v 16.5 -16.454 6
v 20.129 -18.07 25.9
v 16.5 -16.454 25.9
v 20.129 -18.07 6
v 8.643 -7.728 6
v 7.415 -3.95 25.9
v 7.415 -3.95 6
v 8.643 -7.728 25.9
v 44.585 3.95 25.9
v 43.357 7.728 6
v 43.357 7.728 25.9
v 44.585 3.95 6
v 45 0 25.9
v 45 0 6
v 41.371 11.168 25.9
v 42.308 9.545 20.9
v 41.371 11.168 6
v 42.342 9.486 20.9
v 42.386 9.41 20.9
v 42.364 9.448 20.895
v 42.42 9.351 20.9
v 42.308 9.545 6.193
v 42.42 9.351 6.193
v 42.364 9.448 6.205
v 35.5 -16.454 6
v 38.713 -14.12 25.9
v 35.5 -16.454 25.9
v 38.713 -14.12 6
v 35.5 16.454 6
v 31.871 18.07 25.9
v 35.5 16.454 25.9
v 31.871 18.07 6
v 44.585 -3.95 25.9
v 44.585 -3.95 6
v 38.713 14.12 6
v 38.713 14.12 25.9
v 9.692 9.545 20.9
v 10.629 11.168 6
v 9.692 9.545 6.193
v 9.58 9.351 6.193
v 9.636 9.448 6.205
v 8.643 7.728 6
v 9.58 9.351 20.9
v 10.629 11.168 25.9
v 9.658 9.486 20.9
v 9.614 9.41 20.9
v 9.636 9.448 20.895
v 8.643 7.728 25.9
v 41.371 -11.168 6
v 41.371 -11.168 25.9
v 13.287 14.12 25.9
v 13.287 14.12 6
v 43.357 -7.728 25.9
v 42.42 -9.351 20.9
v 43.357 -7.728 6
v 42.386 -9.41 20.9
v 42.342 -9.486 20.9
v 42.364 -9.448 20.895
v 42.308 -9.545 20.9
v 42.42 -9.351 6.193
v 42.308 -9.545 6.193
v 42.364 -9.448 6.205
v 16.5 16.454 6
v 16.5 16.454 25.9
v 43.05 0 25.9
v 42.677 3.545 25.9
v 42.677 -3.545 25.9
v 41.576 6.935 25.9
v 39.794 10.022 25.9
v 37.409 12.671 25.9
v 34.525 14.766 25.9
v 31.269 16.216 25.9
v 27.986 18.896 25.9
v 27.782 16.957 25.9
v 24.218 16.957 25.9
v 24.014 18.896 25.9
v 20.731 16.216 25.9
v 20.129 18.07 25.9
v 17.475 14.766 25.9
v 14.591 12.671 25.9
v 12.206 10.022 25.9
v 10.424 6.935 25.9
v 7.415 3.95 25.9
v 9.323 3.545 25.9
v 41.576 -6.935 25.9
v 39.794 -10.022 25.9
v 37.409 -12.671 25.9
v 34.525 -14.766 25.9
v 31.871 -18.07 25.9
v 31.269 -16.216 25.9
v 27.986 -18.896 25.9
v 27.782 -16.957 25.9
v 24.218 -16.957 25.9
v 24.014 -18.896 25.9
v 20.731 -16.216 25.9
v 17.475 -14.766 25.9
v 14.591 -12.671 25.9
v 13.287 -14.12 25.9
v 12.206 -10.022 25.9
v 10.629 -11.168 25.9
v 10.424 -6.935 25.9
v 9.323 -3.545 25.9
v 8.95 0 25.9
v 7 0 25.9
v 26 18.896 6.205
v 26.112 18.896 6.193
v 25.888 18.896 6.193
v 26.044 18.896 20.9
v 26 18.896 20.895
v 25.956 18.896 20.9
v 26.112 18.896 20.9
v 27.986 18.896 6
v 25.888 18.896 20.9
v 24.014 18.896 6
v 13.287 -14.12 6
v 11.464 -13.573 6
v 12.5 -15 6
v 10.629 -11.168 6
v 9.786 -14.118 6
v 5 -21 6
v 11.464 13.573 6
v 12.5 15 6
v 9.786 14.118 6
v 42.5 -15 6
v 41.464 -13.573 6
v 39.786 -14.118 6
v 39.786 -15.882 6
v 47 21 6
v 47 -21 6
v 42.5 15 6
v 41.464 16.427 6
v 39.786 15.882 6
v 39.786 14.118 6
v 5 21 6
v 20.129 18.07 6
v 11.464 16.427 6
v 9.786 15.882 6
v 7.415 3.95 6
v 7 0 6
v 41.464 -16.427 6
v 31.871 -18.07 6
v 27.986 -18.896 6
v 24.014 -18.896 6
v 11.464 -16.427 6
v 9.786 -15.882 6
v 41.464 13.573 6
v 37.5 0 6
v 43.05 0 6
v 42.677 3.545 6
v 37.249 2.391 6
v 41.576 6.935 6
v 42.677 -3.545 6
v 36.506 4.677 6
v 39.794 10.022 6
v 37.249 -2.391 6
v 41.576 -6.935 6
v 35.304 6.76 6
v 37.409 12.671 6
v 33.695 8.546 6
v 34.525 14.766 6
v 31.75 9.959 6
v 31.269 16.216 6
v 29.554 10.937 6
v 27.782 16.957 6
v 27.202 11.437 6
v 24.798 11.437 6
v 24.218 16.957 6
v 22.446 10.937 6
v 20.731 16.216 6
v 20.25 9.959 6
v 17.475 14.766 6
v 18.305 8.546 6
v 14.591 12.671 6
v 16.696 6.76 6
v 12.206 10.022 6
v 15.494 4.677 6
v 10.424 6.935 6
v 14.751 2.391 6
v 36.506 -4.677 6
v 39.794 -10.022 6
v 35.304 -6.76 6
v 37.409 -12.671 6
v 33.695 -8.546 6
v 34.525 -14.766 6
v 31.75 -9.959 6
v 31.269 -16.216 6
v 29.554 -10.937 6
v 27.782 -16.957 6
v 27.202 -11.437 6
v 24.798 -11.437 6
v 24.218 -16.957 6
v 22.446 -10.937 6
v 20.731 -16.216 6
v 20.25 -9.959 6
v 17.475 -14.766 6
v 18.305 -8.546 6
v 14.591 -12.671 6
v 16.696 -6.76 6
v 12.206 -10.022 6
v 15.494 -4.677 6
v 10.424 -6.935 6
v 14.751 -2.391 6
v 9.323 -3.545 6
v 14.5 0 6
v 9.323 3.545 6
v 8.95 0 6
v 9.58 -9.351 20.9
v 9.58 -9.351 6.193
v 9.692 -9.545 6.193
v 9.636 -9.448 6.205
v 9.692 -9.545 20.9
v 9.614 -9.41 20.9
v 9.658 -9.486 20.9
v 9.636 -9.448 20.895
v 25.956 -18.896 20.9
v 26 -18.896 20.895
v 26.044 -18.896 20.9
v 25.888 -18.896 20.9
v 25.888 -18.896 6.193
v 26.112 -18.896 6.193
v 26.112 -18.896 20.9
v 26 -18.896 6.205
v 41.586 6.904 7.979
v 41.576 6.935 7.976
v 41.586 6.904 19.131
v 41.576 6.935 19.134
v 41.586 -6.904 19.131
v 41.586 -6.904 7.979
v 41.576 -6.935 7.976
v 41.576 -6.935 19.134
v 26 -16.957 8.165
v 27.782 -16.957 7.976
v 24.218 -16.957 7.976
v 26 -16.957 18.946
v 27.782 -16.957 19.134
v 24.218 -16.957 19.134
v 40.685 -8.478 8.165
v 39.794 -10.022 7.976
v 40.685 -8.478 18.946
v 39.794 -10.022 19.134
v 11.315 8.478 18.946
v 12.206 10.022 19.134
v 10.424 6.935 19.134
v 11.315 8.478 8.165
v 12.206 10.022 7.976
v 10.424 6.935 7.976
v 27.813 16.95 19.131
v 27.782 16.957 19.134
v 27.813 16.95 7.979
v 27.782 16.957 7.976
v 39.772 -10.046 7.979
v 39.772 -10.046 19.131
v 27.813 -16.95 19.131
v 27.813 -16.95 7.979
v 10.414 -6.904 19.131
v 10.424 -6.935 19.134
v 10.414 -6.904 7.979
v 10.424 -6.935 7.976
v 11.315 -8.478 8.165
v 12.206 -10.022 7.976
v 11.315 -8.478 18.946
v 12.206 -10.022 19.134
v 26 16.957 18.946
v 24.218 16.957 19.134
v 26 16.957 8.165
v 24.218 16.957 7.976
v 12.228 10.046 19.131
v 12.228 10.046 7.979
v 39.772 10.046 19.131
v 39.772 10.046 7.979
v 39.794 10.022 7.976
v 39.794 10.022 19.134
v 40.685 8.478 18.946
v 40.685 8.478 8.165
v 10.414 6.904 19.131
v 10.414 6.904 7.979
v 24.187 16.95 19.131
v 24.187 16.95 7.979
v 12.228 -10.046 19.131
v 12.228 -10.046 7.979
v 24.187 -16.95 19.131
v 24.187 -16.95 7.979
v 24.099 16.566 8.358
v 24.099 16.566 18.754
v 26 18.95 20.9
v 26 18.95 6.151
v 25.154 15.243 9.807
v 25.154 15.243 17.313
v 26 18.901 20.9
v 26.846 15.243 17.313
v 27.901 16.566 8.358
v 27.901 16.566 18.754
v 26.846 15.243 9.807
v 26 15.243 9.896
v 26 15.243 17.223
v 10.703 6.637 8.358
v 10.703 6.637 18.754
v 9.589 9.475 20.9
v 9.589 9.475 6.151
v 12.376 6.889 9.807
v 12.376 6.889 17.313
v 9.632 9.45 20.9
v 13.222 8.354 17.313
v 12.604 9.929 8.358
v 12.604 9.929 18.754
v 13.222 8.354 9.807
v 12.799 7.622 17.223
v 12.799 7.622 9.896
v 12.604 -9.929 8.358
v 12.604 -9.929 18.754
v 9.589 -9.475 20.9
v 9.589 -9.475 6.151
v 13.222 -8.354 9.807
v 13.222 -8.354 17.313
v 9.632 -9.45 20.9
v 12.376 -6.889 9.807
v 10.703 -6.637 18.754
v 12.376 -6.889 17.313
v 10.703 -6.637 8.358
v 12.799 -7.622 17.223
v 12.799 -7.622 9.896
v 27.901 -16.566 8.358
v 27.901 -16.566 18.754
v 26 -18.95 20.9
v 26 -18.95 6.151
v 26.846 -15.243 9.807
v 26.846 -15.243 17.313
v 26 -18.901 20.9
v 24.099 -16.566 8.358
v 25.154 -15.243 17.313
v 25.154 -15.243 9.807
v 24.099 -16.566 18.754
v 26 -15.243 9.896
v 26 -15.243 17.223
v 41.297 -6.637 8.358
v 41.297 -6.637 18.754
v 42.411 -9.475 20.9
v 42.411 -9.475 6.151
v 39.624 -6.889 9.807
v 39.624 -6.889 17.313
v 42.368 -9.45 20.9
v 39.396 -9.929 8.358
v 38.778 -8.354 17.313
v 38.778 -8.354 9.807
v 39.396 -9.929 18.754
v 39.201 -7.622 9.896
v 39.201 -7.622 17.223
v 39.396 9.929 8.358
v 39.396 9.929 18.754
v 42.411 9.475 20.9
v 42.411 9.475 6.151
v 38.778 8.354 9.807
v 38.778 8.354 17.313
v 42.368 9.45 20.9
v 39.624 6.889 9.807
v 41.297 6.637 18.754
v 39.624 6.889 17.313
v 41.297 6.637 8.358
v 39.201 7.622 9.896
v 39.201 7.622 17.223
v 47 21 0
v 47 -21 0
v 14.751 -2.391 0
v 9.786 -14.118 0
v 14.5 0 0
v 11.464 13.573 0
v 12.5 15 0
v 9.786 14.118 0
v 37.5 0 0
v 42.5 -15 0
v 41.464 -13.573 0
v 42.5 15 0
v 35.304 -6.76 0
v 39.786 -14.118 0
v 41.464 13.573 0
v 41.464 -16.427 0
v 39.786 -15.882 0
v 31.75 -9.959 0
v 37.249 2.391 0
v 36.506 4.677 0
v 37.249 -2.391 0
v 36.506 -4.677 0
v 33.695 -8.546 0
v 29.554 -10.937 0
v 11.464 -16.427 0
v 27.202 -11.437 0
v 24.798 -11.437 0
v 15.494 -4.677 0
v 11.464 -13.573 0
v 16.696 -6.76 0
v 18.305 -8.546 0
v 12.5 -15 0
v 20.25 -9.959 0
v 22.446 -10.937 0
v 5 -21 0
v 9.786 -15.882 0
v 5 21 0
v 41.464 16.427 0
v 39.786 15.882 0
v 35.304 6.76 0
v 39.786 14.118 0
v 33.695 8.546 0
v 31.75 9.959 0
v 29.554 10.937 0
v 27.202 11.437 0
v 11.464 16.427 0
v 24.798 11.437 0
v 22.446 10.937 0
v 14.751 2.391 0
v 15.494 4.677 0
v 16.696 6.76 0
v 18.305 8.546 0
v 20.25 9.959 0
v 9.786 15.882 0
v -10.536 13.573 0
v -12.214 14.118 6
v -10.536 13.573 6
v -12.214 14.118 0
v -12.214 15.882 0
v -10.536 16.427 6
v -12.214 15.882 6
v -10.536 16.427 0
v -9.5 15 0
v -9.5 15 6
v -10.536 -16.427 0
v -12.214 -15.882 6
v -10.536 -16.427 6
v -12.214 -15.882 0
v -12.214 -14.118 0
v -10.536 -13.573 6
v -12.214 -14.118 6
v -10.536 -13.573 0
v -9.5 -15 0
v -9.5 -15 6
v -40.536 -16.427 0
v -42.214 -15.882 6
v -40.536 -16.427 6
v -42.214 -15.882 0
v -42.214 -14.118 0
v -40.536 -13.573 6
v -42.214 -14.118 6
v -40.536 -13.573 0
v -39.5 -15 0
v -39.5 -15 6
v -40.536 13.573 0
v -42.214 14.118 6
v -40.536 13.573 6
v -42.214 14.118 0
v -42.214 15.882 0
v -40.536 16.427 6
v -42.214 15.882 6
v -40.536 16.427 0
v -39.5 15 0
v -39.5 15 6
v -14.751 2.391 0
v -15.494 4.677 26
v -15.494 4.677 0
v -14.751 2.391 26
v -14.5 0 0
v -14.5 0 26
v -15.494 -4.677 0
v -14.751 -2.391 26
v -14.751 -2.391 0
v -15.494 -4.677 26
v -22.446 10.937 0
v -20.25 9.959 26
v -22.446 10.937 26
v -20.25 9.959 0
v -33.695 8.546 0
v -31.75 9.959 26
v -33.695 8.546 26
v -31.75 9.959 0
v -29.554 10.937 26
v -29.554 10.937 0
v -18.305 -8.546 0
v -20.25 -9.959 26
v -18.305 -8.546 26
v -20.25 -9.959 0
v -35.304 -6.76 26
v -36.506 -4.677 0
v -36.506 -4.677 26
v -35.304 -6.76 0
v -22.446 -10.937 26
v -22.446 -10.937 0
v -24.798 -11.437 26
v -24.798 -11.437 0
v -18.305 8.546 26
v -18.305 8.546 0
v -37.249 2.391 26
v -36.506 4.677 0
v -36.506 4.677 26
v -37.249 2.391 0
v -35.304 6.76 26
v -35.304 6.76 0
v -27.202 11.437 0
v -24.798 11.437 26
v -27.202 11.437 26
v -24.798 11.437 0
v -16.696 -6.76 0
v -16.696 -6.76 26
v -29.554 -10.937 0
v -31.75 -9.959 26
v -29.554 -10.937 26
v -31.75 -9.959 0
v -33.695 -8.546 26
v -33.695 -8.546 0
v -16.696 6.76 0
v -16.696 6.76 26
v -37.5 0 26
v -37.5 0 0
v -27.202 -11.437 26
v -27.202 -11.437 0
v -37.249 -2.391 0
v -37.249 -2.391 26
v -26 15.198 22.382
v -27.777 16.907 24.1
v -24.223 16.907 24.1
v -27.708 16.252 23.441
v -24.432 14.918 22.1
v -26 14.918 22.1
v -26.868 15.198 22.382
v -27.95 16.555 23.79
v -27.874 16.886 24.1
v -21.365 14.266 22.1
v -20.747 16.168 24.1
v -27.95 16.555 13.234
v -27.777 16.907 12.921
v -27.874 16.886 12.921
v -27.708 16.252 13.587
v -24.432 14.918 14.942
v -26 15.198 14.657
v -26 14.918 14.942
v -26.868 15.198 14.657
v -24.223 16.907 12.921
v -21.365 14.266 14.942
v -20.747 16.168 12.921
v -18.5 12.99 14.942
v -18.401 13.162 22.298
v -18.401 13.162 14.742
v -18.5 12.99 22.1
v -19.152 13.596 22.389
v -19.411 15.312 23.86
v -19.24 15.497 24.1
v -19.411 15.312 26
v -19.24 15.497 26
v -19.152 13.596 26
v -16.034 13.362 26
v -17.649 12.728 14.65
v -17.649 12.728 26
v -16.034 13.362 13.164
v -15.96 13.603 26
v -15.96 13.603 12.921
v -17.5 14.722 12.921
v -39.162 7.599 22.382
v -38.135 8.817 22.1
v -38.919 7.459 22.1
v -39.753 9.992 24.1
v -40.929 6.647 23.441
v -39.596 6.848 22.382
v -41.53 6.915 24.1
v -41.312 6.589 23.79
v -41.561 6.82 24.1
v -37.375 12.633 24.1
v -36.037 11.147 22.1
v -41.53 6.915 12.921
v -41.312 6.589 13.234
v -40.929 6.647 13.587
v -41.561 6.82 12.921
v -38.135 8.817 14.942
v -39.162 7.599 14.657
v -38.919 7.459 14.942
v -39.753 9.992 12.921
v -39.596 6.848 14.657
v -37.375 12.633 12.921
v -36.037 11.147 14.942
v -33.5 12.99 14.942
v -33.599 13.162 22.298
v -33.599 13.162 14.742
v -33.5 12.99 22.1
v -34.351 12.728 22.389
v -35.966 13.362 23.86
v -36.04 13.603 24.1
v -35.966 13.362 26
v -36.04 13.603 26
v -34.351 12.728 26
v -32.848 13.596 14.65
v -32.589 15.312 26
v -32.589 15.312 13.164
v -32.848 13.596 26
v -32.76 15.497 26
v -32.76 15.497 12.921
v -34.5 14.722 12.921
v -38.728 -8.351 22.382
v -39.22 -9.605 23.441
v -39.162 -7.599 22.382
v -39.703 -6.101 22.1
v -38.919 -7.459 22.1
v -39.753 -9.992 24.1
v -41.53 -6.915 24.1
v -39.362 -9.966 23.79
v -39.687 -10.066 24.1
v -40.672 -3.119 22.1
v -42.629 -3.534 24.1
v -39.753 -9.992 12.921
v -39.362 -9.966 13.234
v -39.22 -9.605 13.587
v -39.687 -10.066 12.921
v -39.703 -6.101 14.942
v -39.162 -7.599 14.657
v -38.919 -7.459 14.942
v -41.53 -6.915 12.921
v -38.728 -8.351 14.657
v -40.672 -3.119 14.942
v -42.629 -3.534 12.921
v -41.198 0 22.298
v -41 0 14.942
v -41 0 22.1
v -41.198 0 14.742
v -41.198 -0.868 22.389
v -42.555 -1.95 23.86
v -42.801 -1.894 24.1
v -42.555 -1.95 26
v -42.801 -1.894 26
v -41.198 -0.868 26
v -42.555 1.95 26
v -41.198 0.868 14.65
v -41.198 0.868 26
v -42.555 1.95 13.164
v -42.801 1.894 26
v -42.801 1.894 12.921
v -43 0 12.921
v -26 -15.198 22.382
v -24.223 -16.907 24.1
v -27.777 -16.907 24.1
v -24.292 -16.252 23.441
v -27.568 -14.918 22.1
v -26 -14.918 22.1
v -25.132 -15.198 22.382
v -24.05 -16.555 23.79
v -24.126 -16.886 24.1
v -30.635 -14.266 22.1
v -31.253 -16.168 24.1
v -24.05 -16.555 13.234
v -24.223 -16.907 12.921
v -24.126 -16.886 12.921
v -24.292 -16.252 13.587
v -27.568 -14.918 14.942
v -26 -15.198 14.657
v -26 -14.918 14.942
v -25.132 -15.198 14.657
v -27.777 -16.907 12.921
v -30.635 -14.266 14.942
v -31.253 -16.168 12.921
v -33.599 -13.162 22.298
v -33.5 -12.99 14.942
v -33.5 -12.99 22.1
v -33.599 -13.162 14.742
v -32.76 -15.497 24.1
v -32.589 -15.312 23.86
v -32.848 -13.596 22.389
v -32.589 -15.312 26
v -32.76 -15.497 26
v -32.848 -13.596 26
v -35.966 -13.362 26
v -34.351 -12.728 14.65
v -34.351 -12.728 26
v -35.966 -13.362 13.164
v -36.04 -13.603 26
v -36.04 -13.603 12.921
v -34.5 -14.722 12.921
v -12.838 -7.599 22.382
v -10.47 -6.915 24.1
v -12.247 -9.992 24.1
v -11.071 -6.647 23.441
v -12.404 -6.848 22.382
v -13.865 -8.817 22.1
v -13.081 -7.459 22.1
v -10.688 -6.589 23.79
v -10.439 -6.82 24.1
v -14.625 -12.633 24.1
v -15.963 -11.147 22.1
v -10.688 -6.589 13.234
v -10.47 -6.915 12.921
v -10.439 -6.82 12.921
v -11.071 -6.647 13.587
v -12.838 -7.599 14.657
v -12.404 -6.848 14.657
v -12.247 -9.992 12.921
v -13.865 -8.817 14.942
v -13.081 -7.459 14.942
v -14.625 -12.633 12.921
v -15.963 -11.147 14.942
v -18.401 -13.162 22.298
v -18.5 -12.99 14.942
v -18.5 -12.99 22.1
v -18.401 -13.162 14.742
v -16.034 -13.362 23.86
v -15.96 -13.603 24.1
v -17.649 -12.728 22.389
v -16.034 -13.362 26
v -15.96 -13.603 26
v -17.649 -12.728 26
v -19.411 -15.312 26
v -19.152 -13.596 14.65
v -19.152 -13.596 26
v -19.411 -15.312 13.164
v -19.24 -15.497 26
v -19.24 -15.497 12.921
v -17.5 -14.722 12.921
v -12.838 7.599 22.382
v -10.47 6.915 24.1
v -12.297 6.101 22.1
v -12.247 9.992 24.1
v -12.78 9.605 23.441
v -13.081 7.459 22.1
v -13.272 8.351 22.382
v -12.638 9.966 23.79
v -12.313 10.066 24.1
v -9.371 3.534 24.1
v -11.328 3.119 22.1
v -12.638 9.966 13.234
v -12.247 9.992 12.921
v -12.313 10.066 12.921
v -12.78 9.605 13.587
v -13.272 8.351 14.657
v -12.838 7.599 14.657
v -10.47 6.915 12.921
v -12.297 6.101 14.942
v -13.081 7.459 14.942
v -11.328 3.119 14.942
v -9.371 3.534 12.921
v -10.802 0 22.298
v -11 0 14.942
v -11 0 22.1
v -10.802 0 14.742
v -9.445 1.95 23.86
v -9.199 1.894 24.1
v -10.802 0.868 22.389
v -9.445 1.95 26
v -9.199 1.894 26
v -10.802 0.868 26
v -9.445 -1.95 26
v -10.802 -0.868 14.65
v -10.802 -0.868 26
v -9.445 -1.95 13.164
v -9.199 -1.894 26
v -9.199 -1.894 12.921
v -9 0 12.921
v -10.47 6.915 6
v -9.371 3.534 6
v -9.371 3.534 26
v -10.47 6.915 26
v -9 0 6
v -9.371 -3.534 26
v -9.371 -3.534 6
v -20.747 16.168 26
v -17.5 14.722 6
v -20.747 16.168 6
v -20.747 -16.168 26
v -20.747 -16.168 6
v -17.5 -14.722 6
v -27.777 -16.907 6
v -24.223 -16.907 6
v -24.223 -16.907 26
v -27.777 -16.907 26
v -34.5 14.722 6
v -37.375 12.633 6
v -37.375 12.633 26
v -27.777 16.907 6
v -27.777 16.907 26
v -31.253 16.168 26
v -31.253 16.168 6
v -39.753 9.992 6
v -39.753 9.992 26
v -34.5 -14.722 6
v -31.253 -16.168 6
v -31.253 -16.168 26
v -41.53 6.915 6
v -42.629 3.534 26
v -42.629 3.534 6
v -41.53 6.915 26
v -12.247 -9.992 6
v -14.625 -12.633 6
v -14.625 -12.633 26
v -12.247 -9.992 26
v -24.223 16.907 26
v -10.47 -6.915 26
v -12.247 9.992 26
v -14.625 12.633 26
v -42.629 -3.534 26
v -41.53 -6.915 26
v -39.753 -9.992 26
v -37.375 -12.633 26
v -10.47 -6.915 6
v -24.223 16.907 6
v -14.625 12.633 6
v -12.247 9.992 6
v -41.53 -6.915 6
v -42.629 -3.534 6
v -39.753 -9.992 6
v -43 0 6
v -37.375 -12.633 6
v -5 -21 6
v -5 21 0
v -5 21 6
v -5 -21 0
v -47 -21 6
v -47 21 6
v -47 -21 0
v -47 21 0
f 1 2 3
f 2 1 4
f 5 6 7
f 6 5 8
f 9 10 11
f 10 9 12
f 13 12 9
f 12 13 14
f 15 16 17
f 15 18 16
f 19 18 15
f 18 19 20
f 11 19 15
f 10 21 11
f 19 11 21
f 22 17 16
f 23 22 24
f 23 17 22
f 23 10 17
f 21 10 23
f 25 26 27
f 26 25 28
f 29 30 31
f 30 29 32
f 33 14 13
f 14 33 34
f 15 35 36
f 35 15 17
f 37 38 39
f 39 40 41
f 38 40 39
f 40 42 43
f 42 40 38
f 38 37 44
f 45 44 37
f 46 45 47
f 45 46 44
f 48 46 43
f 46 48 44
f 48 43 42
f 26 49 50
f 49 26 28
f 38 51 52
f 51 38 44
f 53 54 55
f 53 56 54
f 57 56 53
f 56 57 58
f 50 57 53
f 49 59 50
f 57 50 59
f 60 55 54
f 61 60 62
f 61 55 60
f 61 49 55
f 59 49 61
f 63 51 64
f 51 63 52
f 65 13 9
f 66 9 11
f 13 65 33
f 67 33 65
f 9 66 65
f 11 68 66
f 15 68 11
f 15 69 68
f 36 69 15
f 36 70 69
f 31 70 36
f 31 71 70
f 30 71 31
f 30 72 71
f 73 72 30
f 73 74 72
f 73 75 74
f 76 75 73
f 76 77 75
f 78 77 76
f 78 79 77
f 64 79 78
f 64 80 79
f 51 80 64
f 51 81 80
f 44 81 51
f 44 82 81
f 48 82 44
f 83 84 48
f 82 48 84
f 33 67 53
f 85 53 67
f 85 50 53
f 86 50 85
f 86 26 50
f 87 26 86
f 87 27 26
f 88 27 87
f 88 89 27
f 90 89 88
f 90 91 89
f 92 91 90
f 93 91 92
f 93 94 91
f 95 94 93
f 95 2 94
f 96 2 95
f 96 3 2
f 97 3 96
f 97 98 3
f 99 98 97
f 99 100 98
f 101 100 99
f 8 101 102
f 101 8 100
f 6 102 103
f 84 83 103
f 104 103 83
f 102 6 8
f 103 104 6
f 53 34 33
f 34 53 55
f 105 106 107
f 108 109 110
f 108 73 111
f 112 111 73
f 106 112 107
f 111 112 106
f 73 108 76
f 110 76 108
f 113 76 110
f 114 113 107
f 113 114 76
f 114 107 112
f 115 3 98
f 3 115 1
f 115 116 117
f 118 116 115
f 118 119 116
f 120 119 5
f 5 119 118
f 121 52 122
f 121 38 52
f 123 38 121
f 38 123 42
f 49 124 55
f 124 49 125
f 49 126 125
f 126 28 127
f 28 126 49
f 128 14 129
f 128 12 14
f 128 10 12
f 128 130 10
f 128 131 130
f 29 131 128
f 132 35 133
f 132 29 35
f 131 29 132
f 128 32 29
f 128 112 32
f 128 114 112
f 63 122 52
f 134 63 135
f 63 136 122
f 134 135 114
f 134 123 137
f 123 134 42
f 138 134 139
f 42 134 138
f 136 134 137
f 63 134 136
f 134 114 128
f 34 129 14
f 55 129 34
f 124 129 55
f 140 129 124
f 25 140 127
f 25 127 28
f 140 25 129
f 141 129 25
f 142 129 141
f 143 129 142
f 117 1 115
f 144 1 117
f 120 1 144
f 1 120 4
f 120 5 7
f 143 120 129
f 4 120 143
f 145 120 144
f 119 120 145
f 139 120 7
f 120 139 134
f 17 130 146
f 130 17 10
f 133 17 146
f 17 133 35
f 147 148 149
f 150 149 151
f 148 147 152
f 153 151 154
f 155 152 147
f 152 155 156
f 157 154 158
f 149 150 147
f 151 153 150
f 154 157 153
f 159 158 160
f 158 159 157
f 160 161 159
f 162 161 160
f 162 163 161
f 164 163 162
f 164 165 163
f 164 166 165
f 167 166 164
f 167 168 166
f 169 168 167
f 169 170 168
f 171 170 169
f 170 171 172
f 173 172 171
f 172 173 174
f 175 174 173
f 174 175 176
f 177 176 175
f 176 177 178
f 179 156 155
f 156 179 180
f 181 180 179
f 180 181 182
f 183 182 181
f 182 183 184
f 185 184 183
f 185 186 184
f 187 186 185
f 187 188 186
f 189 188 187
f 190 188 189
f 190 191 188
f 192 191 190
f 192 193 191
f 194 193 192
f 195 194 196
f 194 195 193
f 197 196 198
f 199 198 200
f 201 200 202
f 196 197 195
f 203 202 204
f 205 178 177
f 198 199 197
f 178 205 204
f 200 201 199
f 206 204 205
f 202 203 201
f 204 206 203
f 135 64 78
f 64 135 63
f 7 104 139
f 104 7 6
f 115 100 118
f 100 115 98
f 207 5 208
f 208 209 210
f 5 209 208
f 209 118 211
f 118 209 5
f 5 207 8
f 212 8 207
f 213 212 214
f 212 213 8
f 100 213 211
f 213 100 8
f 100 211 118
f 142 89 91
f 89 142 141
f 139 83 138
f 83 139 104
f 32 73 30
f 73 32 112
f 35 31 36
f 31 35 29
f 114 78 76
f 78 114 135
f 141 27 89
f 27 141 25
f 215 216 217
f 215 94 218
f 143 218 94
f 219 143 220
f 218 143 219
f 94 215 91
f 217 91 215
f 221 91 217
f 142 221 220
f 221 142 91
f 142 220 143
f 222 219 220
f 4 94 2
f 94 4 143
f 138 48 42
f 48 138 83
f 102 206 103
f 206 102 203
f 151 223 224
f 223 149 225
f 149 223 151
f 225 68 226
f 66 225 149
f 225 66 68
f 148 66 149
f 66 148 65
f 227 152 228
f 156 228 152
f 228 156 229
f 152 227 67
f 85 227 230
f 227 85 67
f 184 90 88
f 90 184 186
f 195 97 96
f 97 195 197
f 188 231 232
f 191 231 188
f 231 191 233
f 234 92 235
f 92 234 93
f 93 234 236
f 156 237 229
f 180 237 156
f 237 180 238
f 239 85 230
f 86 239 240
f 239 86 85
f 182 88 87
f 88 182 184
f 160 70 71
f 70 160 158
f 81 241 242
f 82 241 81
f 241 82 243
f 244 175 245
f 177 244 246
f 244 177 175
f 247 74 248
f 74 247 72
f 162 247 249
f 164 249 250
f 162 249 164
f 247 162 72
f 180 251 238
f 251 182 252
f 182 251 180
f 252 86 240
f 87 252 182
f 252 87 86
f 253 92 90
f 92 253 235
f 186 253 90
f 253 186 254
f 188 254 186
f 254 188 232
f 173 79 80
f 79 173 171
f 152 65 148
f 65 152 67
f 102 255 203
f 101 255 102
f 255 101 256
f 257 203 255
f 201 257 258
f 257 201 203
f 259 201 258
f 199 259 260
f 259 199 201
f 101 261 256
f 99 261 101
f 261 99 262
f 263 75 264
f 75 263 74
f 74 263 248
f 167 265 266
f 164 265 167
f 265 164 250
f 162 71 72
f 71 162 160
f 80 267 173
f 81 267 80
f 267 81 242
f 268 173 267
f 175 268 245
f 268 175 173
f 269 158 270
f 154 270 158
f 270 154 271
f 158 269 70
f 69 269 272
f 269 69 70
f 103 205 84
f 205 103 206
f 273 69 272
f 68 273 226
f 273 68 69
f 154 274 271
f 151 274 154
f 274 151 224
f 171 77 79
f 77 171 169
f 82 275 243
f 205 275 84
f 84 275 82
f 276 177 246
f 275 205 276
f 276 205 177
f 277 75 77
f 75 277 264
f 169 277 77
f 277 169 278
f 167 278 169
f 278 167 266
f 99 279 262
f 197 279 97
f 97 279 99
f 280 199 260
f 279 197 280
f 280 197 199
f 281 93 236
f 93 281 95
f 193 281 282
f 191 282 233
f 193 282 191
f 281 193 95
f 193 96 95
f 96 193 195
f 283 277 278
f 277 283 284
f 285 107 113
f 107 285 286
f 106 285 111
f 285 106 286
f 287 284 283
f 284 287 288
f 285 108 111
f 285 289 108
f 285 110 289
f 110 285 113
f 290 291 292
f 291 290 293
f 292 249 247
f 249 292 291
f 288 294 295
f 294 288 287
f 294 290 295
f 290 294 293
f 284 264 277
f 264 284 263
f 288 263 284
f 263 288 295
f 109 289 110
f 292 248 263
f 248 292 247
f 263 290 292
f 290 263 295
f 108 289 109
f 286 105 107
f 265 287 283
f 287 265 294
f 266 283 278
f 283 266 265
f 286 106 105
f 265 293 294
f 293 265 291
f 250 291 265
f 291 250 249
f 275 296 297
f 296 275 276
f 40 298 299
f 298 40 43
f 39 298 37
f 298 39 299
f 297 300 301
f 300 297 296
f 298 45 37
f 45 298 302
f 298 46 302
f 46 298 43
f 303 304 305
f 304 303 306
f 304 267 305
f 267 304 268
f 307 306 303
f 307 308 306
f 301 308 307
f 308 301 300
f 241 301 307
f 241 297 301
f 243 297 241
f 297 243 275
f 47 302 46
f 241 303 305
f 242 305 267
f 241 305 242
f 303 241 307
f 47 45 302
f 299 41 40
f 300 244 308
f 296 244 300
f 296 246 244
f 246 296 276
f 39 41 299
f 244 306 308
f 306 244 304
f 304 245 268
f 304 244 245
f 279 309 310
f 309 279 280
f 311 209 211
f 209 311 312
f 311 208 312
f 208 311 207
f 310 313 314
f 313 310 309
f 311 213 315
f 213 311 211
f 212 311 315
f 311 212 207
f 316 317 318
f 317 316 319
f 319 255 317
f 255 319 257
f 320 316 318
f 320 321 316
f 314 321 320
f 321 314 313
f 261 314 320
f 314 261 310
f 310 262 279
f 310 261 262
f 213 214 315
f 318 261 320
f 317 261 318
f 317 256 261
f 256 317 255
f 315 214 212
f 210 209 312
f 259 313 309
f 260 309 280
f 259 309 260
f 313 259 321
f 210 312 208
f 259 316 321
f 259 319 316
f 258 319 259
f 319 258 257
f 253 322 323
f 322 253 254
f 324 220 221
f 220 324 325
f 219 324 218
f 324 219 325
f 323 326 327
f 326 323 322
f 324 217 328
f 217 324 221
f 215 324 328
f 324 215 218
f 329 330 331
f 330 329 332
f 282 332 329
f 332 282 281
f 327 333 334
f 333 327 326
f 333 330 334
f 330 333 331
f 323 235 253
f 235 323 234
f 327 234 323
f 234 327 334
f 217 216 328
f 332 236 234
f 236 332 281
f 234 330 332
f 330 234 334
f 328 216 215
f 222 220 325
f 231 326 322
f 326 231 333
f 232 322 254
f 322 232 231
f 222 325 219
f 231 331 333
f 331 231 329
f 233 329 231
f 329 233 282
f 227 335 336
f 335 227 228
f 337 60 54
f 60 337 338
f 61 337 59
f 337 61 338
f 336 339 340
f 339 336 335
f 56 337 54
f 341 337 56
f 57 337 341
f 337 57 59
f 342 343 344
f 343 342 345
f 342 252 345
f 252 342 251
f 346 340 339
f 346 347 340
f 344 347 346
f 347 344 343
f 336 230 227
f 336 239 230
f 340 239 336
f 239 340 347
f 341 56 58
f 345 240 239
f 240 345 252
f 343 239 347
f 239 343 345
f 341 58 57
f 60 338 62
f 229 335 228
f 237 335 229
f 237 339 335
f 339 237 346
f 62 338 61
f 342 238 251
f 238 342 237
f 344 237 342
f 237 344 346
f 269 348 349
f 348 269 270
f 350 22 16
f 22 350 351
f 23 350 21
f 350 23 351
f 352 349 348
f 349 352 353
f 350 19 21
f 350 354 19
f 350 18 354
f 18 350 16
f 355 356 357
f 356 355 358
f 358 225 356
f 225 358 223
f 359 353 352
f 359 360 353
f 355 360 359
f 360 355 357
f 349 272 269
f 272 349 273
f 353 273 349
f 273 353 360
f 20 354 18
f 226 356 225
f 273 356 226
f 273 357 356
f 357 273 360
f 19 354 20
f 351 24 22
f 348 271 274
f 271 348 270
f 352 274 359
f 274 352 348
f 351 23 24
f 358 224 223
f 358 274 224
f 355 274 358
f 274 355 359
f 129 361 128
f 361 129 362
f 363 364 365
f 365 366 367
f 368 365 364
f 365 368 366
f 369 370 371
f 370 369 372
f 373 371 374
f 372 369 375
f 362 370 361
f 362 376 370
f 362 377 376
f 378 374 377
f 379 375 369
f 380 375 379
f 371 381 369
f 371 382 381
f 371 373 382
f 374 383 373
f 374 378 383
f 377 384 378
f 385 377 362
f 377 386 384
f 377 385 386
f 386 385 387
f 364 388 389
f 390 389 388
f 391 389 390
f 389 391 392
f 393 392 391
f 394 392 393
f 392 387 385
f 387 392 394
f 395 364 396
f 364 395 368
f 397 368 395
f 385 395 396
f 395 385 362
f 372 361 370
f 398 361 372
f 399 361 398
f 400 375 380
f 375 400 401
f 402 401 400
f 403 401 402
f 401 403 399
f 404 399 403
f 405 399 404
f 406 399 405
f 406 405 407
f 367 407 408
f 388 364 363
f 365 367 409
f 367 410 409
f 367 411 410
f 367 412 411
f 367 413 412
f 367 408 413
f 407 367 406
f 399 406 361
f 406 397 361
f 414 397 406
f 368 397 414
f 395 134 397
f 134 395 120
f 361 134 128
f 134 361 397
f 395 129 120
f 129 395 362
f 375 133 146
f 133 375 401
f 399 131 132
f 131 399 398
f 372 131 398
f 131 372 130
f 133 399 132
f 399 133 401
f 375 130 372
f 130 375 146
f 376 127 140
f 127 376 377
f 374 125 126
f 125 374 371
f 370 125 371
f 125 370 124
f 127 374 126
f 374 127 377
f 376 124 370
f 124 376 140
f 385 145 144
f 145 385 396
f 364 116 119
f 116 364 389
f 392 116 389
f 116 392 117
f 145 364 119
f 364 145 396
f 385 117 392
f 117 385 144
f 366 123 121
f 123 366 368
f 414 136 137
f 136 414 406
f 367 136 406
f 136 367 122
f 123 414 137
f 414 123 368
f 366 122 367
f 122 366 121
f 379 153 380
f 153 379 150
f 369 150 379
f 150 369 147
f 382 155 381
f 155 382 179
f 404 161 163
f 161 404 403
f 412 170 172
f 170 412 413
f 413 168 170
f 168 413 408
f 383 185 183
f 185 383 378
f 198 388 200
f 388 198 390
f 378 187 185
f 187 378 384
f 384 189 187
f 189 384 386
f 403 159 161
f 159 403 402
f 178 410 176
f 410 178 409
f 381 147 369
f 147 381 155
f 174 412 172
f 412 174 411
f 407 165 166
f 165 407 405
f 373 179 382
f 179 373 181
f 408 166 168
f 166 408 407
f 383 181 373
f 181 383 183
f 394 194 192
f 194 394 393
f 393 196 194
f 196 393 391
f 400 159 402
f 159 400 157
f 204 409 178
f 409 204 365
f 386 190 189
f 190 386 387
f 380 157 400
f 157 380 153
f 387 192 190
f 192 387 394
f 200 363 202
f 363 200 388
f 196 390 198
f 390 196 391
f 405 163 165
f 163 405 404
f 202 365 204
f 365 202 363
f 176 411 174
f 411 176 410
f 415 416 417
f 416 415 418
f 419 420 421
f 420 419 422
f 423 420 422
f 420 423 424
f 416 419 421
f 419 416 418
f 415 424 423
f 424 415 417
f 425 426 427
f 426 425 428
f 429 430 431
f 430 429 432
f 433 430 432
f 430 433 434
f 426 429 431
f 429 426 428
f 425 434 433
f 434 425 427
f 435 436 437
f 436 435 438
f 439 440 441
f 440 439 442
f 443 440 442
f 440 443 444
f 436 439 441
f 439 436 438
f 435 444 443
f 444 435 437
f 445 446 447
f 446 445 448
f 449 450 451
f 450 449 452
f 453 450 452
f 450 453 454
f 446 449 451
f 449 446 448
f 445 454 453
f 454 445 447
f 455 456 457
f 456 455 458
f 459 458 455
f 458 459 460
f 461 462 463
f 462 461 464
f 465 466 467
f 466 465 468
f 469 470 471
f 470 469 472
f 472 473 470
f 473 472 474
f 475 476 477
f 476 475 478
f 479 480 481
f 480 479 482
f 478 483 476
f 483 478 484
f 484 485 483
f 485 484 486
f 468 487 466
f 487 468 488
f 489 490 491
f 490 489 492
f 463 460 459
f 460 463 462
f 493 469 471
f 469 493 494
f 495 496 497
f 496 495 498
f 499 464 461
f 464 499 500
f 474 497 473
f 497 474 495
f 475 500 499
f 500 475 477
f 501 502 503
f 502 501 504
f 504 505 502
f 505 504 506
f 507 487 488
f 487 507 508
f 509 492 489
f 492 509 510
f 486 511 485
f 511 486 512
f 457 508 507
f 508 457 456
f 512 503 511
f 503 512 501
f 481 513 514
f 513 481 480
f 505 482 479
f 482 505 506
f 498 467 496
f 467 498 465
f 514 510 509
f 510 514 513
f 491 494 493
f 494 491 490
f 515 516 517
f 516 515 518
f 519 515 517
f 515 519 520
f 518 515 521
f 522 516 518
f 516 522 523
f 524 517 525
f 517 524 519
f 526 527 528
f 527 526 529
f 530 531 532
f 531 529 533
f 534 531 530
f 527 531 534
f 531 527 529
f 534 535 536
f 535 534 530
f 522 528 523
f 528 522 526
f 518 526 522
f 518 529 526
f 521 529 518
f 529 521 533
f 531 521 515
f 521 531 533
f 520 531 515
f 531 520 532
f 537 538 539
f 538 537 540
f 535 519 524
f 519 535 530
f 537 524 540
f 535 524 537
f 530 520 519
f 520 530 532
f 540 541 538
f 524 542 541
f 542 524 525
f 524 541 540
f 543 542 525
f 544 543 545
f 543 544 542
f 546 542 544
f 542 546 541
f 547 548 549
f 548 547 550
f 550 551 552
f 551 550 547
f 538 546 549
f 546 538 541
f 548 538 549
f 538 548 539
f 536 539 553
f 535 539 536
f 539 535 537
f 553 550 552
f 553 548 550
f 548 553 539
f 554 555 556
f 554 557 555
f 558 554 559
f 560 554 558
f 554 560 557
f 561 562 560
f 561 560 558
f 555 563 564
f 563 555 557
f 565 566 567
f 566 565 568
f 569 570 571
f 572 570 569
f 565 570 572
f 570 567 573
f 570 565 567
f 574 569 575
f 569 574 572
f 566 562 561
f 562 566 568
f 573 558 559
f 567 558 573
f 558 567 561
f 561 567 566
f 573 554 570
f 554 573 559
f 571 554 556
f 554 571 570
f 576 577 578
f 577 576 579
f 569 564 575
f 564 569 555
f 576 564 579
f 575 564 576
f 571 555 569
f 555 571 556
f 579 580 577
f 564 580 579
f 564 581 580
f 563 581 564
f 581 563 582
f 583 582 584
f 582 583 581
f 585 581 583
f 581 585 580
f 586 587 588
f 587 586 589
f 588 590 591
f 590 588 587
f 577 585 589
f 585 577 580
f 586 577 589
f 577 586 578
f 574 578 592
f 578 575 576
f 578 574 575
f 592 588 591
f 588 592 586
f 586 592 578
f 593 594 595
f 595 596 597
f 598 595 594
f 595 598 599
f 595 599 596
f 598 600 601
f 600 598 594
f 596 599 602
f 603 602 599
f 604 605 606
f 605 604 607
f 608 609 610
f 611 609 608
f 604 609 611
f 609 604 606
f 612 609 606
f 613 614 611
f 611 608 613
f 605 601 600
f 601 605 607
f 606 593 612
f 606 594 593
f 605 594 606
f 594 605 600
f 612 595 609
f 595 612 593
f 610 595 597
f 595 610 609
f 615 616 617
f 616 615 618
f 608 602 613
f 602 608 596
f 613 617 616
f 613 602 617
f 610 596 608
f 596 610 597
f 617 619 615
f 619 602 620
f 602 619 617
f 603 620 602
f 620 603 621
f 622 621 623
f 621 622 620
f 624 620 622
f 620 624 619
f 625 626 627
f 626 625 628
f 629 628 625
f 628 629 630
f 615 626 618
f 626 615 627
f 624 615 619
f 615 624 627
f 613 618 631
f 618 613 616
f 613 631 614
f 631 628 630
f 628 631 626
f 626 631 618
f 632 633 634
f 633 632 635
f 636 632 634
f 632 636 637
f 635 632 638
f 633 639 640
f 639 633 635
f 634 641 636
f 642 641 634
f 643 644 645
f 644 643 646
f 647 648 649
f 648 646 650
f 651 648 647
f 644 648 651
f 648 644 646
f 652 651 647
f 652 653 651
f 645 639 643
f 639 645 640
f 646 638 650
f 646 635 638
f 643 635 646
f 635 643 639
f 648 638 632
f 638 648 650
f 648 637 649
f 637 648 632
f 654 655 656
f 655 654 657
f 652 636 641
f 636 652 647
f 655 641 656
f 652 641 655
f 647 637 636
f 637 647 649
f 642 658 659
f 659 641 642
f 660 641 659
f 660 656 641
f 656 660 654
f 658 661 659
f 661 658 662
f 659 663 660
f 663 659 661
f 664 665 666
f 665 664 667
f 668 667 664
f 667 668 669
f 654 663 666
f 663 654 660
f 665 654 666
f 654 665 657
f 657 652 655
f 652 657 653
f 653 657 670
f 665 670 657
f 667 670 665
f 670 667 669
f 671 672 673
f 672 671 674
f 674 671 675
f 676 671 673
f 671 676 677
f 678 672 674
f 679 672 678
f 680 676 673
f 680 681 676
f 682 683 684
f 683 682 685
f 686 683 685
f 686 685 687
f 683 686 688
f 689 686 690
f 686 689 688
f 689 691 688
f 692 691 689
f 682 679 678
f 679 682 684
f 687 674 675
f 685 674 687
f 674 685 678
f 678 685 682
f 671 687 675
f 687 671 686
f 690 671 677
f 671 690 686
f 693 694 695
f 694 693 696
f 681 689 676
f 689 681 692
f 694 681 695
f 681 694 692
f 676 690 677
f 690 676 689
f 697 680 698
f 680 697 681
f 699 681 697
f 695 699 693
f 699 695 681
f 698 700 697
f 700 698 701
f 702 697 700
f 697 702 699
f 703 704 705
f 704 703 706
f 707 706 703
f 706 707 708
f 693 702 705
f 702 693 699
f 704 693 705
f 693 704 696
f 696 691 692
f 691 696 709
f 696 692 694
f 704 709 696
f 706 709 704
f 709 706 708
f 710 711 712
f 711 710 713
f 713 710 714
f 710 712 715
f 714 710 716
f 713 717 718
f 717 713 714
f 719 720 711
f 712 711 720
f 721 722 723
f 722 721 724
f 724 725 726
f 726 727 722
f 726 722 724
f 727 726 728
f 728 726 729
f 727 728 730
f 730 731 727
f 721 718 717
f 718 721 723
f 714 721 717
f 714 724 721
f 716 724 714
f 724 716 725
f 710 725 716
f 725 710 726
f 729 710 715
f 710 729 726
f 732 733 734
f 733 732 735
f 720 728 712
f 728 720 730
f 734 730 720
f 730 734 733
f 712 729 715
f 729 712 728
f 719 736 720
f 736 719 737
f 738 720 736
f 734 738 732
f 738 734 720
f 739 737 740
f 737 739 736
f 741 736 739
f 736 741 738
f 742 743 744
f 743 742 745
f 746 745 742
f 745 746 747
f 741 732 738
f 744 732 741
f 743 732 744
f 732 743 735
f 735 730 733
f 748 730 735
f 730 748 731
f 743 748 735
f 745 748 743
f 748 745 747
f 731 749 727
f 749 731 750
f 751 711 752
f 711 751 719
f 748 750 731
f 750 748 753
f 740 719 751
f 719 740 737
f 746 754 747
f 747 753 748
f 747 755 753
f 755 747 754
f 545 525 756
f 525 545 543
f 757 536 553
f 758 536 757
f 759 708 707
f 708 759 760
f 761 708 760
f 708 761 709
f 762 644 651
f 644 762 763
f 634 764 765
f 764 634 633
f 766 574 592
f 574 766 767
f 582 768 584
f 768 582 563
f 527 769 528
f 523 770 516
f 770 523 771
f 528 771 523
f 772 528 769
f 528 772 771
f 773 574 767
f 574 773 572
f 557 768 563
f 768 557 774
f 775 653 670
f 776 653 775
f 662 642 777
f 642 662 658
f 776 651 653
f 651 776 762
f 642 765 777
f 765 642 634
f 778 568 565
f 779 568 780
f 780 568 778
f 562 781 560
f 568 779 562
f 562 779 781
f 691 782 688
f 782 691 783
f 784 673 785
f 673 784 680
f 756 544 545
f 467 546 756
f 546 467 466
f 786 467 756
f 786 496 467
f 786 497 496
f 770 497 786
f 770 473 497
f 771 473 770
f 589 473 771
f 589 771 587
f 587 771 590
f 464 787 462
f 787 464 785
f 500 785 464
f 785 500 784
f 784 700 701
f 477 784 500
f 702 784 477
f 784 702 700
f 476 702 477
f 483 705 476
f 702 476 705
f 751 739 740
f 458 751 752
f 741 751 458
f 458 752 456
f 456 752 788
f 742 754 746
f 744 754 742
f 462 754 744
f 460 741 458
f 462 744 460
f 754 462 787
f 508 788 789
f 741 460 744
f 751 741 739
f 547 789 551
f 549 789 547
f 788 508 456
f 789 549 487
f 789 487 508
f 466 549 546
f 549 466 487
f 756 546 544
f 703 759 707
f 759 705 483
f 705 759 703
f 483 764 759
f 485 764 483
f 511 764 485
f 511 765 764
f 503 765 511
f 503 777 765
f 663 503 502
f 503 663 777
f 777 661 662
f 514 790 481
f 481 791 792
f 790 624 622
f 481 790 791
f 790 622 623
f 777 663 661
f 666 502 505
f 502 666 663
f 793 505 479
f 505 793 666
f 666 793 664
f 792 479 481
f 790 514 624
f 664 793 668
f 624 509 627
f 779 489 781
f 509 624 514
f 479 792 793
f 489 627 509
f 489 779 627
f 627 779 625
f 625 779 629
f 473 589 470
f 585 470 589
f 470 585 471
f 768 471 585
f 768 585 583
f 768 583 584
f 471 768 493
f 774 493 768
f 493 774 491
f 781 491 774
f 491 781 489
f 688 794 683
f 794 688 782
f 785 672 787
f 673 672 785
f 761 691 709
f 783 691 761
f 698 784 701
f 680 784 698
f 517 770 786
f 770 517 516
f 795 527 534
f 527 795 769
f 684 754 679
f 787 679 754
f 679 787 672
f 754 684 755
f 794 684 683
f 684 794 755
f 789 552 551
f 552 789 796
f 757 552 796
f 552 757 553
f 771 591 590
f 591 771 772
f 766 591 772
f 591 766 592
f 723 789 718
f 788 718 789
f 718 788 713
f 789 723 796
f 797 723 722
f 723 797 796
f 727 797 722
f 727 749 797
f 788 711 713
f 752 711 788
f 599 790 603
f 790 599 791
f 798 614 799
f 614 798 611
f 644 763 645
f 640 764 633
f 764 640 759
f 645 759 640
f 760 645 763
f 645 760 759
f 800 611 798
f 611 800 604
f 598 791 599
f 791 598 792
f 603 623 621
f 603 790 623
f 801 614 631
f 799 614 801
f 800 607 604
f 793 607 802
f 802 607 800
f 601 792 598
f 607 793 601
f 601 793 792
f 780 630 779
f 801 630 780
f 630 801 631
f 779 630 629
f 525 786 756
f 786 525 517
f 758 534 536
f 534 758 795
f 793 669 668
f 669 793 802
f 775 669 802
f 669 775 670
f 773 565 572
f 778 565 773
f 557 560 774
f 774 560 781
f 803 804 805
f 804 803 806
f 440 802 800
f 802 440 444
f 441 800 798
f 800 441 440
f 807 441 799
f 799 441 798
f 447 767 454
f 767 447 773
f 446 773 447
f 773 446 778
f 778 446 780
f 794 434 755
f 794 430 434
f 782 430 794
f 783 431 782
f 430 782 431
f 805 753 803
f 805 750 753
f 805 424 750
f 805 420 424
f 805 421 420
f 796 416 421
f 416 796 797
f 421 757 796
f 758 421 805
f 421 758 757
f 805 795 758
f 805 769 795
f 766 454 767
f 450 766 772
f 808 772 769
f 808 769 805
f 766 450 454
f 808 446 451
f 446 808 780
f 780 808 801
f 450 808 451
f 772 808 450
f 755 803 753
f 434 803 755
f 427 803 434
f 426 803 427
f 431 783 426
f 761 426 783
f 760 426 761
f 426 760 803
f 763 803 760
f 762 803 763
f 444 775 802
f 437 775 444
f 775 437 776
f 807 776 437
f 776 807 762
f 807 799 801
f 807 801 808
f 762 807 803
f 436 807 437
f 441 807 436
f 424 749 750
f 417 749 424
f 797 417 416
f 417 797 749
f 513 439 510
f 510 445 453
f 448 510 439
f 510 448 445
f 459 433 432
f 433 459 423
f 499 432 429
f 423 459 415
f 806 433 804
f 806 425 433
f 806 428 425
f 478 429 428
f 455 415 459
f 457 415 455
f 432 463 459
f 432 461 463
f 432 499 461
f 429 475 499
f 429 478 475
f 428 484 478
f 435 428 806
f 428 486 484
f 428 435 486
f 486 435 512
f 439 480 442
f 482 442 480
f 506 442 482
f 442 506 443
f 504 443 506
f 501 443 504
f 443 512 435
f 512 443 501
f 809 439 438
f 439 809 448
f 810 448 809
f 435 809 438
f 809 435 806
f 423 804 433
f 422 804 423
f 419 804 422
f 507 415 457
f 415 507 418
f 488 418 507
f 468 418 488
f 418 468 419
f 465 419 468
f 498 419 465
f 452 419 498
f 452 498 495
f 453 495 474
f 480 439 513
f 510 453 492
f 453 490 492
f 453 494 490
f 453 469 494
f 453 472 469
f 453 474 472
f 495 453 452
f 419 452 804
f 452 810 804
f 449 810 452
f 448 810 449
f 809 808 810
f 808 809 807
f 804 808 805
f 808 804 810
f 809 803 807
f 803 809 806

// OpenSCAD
// stepper twist mount 
// tigger@interthingy.com
// 201029061241

// twist clip stepper mount

// modes
// 0 -  base only
// 1 - socket only
// 2 - cutaway
// 3 - interference check
// 4 - single stl

mode = 4; 

// variables
nema = 17; 


bolt = 3;
size = 42;
hole_size = 30;
base_thickness = 6;
boss_radius = 15;
inner_hole_radius = 11.5;
mount_height = 20;

clip_depth = 15;
clip_thickness = 4;
slot_height = 15;

clip_count  = 6;

//extras


overlap = 0.1;
clearance = 0.1;
inc = 360/clip_count;
splitter = 150;

module pip()
{
	inc = 360/(2*clip_count);
	clip_rad =  boss_radius+clip_thickness/2-clip_thickness/2;
	difference()
	{
		translate([boss_radius+clip_thickness/2,0,clearance])
		cylinder(h=slot_height-2*clearance,r=clip_thickness/2-clearance/2);
		translate([0,0,-boss_radius-clip_thickness+slot_height-clearance])
		cylinder(h=boss_radius+clip_thickness+overlap,r1=0,r2=boss_radius+clip_thickness);
		translate([0,0,clearance])
		cylinder(h=boss_radius+clip_thickness+overlap*2,r2=0,r1=boss_radius+clip_thickness);
	}
}

module slot()
{
	inc = 360/(2*clip_count);
	clip_rad =  boss_radius+clip_thickness/2-clip_thickness/2;
	difference()
	{
		rotate([0,0,inc])
		translate([boss_radius+clip_thickness/2,0,0])
		cylinder(h=slot_height-overlap,r=clip_thickness/2);
		union()
		{
			translate([0,0,-boss_radius-clip_thickness+slot_height+overlap])
			cylinder(h=boss_radius+clip_thickness,r1=0,r2=boss_radius+clip_thickness);
			translate([0,0,-overlap])
			cylinder(h=boss_radius+clip_thickness+overlap*2,r2=0,r1=boss_radius+clip_thickness);
		}
	}
	difference()
	{
		union()
		{
			translate([boss_radius+clip_thickness/2,0,0])
			cylinder(h=clip_depth+overlap,r=clip_thickness/2);
			intersection()
			{
				intersection()
				{
					rotate(-90,[0,0,1])
					rotate(inc,[0,0,1])
					cube(size=boss_radius*4);
					cube(size=boss_radius*4);

				}
				difference()
				{
					cylinder(h=slot_height,r=boss_radius+clip_thickness+overlap);
					translate([0,0,-overlap])
					cylinder(h=slot_height+overlap*2, r=clip_rad);
					translate([0,0,-boss_radius-clip_thickness+slot_height+overlap])
					cylinder(h=boss_radius+clip_thickness,r1=0,r2=boss_radius+clip_thickness);
				}
			}
		}
		translate([0,0,-overlap])
		cylinder(h=boss_radius+clip_thickness+overlap*2,r2=0,r1=boss_radius+clip_thickness);
	}		
}

module pips()
{
	inc = 360/clip_count;
	for ( z = [1:clip_count])
	{       
		rotate(z*inc,[0,0,1])           
		pip();
	}
}

module slots()
{
	inc = 360/clip_count;
	for ( z = [1:clip_count])
	{       
		rotate(z*inc,[0,0,1])           
		slot();
	}
}

module bolt_hole()
{
	union()
	{
		cylinder(h=base_thickness*10,r=bolt/2,center=true);
//		translate([0,0,base_thickness*2])
//		cylinder(h=base_thickness*10,r=bolt,center=false);
	}	
}

module holes()
{
	union()
	{
		// bolt holes
		translate([hole_size/2,hole_size/2,-2*base_thickness])
		bolt_hole();
		translate([hole_size/2,-hole_size/2,-2*base_thickness])
		bolt_hole();
		translate([-hole_size/2,-hole_size/2,-2*base_thickness])
		bolt_hole();
		translate([-hole_size/2,hole_size/2,-2*base_thickness])
		bolt_hole();
	
		// center hole
		 cylinder(h = base_thickness+3*mount_height , r = inner_hole_radius, center=true);
	}
}

module socket_base()
{
	union()
		{
		difference()
		{
			cylinder(h=mount_height-clearance,r=boss_radius+clip_thickness);
			cylinder(h=mount_height-clearance,r=boss_radius+clip_thickness/2+clearance/2);
		}
		translate([0,0,(clip_depth-slot_height)])
		rotate([0,0,inc/2])
		pips();
	}
}

module twist_base()
{
	union()
	{
		difference()
		{
			translate([0,0,-overlap])
			cylinder(h=mount_height+overlap,r=boss_radius+clip_thickness/2);
			union()
			{
				translate([0,0,mount_height-clip_depth])
				slots();
			}
		}
	}
}

module base()
{
	
	difference()
	{
		union()
		{
			translate([0,0,base_thickness/2])
			cube( size = [size,size,base_thickness] , center = true);
			translate([0,0,base_thickness])
			twist_base();
		}
		holes();
	}
}

module socket()
{

	difference()
	{
		union()
		{
			translate([0,0,base_thickness/2])
			cube( size = [size,size,base_thickness] , center = true);
			translate([0,0,base_thickness])
			socket_base();
		}
		holes();
	}
}

module placed_socket()
{
	translate([0,0,2*base_thickness+mount_height])
	rotate([0,180,0])

	socket();
}

module splitter()
{
	// for checking internal layout
	translate([0,-splitter/2,-splitter/2])
	cube(splitter);
}

// modal display 

if ( mode == 0)
{
	base();
}

if (mode == 1)
{
	socket();
}

if ( mode == 2)
{
	rotate([0,0,inc/2])
	difference()
	{
		placed_socket();
		//socket();
		rotate([0,0,inc/2])
		splitter();
	}
	base();
}

if (mode == 3)
{
	intersection()
	{
		placed_socket();
		base();
	}
}

if( mode == 4)
{
	translate([size/2+5,0,0])
	socket();
	translate([-size/2-5,0,0])
	base();
}
